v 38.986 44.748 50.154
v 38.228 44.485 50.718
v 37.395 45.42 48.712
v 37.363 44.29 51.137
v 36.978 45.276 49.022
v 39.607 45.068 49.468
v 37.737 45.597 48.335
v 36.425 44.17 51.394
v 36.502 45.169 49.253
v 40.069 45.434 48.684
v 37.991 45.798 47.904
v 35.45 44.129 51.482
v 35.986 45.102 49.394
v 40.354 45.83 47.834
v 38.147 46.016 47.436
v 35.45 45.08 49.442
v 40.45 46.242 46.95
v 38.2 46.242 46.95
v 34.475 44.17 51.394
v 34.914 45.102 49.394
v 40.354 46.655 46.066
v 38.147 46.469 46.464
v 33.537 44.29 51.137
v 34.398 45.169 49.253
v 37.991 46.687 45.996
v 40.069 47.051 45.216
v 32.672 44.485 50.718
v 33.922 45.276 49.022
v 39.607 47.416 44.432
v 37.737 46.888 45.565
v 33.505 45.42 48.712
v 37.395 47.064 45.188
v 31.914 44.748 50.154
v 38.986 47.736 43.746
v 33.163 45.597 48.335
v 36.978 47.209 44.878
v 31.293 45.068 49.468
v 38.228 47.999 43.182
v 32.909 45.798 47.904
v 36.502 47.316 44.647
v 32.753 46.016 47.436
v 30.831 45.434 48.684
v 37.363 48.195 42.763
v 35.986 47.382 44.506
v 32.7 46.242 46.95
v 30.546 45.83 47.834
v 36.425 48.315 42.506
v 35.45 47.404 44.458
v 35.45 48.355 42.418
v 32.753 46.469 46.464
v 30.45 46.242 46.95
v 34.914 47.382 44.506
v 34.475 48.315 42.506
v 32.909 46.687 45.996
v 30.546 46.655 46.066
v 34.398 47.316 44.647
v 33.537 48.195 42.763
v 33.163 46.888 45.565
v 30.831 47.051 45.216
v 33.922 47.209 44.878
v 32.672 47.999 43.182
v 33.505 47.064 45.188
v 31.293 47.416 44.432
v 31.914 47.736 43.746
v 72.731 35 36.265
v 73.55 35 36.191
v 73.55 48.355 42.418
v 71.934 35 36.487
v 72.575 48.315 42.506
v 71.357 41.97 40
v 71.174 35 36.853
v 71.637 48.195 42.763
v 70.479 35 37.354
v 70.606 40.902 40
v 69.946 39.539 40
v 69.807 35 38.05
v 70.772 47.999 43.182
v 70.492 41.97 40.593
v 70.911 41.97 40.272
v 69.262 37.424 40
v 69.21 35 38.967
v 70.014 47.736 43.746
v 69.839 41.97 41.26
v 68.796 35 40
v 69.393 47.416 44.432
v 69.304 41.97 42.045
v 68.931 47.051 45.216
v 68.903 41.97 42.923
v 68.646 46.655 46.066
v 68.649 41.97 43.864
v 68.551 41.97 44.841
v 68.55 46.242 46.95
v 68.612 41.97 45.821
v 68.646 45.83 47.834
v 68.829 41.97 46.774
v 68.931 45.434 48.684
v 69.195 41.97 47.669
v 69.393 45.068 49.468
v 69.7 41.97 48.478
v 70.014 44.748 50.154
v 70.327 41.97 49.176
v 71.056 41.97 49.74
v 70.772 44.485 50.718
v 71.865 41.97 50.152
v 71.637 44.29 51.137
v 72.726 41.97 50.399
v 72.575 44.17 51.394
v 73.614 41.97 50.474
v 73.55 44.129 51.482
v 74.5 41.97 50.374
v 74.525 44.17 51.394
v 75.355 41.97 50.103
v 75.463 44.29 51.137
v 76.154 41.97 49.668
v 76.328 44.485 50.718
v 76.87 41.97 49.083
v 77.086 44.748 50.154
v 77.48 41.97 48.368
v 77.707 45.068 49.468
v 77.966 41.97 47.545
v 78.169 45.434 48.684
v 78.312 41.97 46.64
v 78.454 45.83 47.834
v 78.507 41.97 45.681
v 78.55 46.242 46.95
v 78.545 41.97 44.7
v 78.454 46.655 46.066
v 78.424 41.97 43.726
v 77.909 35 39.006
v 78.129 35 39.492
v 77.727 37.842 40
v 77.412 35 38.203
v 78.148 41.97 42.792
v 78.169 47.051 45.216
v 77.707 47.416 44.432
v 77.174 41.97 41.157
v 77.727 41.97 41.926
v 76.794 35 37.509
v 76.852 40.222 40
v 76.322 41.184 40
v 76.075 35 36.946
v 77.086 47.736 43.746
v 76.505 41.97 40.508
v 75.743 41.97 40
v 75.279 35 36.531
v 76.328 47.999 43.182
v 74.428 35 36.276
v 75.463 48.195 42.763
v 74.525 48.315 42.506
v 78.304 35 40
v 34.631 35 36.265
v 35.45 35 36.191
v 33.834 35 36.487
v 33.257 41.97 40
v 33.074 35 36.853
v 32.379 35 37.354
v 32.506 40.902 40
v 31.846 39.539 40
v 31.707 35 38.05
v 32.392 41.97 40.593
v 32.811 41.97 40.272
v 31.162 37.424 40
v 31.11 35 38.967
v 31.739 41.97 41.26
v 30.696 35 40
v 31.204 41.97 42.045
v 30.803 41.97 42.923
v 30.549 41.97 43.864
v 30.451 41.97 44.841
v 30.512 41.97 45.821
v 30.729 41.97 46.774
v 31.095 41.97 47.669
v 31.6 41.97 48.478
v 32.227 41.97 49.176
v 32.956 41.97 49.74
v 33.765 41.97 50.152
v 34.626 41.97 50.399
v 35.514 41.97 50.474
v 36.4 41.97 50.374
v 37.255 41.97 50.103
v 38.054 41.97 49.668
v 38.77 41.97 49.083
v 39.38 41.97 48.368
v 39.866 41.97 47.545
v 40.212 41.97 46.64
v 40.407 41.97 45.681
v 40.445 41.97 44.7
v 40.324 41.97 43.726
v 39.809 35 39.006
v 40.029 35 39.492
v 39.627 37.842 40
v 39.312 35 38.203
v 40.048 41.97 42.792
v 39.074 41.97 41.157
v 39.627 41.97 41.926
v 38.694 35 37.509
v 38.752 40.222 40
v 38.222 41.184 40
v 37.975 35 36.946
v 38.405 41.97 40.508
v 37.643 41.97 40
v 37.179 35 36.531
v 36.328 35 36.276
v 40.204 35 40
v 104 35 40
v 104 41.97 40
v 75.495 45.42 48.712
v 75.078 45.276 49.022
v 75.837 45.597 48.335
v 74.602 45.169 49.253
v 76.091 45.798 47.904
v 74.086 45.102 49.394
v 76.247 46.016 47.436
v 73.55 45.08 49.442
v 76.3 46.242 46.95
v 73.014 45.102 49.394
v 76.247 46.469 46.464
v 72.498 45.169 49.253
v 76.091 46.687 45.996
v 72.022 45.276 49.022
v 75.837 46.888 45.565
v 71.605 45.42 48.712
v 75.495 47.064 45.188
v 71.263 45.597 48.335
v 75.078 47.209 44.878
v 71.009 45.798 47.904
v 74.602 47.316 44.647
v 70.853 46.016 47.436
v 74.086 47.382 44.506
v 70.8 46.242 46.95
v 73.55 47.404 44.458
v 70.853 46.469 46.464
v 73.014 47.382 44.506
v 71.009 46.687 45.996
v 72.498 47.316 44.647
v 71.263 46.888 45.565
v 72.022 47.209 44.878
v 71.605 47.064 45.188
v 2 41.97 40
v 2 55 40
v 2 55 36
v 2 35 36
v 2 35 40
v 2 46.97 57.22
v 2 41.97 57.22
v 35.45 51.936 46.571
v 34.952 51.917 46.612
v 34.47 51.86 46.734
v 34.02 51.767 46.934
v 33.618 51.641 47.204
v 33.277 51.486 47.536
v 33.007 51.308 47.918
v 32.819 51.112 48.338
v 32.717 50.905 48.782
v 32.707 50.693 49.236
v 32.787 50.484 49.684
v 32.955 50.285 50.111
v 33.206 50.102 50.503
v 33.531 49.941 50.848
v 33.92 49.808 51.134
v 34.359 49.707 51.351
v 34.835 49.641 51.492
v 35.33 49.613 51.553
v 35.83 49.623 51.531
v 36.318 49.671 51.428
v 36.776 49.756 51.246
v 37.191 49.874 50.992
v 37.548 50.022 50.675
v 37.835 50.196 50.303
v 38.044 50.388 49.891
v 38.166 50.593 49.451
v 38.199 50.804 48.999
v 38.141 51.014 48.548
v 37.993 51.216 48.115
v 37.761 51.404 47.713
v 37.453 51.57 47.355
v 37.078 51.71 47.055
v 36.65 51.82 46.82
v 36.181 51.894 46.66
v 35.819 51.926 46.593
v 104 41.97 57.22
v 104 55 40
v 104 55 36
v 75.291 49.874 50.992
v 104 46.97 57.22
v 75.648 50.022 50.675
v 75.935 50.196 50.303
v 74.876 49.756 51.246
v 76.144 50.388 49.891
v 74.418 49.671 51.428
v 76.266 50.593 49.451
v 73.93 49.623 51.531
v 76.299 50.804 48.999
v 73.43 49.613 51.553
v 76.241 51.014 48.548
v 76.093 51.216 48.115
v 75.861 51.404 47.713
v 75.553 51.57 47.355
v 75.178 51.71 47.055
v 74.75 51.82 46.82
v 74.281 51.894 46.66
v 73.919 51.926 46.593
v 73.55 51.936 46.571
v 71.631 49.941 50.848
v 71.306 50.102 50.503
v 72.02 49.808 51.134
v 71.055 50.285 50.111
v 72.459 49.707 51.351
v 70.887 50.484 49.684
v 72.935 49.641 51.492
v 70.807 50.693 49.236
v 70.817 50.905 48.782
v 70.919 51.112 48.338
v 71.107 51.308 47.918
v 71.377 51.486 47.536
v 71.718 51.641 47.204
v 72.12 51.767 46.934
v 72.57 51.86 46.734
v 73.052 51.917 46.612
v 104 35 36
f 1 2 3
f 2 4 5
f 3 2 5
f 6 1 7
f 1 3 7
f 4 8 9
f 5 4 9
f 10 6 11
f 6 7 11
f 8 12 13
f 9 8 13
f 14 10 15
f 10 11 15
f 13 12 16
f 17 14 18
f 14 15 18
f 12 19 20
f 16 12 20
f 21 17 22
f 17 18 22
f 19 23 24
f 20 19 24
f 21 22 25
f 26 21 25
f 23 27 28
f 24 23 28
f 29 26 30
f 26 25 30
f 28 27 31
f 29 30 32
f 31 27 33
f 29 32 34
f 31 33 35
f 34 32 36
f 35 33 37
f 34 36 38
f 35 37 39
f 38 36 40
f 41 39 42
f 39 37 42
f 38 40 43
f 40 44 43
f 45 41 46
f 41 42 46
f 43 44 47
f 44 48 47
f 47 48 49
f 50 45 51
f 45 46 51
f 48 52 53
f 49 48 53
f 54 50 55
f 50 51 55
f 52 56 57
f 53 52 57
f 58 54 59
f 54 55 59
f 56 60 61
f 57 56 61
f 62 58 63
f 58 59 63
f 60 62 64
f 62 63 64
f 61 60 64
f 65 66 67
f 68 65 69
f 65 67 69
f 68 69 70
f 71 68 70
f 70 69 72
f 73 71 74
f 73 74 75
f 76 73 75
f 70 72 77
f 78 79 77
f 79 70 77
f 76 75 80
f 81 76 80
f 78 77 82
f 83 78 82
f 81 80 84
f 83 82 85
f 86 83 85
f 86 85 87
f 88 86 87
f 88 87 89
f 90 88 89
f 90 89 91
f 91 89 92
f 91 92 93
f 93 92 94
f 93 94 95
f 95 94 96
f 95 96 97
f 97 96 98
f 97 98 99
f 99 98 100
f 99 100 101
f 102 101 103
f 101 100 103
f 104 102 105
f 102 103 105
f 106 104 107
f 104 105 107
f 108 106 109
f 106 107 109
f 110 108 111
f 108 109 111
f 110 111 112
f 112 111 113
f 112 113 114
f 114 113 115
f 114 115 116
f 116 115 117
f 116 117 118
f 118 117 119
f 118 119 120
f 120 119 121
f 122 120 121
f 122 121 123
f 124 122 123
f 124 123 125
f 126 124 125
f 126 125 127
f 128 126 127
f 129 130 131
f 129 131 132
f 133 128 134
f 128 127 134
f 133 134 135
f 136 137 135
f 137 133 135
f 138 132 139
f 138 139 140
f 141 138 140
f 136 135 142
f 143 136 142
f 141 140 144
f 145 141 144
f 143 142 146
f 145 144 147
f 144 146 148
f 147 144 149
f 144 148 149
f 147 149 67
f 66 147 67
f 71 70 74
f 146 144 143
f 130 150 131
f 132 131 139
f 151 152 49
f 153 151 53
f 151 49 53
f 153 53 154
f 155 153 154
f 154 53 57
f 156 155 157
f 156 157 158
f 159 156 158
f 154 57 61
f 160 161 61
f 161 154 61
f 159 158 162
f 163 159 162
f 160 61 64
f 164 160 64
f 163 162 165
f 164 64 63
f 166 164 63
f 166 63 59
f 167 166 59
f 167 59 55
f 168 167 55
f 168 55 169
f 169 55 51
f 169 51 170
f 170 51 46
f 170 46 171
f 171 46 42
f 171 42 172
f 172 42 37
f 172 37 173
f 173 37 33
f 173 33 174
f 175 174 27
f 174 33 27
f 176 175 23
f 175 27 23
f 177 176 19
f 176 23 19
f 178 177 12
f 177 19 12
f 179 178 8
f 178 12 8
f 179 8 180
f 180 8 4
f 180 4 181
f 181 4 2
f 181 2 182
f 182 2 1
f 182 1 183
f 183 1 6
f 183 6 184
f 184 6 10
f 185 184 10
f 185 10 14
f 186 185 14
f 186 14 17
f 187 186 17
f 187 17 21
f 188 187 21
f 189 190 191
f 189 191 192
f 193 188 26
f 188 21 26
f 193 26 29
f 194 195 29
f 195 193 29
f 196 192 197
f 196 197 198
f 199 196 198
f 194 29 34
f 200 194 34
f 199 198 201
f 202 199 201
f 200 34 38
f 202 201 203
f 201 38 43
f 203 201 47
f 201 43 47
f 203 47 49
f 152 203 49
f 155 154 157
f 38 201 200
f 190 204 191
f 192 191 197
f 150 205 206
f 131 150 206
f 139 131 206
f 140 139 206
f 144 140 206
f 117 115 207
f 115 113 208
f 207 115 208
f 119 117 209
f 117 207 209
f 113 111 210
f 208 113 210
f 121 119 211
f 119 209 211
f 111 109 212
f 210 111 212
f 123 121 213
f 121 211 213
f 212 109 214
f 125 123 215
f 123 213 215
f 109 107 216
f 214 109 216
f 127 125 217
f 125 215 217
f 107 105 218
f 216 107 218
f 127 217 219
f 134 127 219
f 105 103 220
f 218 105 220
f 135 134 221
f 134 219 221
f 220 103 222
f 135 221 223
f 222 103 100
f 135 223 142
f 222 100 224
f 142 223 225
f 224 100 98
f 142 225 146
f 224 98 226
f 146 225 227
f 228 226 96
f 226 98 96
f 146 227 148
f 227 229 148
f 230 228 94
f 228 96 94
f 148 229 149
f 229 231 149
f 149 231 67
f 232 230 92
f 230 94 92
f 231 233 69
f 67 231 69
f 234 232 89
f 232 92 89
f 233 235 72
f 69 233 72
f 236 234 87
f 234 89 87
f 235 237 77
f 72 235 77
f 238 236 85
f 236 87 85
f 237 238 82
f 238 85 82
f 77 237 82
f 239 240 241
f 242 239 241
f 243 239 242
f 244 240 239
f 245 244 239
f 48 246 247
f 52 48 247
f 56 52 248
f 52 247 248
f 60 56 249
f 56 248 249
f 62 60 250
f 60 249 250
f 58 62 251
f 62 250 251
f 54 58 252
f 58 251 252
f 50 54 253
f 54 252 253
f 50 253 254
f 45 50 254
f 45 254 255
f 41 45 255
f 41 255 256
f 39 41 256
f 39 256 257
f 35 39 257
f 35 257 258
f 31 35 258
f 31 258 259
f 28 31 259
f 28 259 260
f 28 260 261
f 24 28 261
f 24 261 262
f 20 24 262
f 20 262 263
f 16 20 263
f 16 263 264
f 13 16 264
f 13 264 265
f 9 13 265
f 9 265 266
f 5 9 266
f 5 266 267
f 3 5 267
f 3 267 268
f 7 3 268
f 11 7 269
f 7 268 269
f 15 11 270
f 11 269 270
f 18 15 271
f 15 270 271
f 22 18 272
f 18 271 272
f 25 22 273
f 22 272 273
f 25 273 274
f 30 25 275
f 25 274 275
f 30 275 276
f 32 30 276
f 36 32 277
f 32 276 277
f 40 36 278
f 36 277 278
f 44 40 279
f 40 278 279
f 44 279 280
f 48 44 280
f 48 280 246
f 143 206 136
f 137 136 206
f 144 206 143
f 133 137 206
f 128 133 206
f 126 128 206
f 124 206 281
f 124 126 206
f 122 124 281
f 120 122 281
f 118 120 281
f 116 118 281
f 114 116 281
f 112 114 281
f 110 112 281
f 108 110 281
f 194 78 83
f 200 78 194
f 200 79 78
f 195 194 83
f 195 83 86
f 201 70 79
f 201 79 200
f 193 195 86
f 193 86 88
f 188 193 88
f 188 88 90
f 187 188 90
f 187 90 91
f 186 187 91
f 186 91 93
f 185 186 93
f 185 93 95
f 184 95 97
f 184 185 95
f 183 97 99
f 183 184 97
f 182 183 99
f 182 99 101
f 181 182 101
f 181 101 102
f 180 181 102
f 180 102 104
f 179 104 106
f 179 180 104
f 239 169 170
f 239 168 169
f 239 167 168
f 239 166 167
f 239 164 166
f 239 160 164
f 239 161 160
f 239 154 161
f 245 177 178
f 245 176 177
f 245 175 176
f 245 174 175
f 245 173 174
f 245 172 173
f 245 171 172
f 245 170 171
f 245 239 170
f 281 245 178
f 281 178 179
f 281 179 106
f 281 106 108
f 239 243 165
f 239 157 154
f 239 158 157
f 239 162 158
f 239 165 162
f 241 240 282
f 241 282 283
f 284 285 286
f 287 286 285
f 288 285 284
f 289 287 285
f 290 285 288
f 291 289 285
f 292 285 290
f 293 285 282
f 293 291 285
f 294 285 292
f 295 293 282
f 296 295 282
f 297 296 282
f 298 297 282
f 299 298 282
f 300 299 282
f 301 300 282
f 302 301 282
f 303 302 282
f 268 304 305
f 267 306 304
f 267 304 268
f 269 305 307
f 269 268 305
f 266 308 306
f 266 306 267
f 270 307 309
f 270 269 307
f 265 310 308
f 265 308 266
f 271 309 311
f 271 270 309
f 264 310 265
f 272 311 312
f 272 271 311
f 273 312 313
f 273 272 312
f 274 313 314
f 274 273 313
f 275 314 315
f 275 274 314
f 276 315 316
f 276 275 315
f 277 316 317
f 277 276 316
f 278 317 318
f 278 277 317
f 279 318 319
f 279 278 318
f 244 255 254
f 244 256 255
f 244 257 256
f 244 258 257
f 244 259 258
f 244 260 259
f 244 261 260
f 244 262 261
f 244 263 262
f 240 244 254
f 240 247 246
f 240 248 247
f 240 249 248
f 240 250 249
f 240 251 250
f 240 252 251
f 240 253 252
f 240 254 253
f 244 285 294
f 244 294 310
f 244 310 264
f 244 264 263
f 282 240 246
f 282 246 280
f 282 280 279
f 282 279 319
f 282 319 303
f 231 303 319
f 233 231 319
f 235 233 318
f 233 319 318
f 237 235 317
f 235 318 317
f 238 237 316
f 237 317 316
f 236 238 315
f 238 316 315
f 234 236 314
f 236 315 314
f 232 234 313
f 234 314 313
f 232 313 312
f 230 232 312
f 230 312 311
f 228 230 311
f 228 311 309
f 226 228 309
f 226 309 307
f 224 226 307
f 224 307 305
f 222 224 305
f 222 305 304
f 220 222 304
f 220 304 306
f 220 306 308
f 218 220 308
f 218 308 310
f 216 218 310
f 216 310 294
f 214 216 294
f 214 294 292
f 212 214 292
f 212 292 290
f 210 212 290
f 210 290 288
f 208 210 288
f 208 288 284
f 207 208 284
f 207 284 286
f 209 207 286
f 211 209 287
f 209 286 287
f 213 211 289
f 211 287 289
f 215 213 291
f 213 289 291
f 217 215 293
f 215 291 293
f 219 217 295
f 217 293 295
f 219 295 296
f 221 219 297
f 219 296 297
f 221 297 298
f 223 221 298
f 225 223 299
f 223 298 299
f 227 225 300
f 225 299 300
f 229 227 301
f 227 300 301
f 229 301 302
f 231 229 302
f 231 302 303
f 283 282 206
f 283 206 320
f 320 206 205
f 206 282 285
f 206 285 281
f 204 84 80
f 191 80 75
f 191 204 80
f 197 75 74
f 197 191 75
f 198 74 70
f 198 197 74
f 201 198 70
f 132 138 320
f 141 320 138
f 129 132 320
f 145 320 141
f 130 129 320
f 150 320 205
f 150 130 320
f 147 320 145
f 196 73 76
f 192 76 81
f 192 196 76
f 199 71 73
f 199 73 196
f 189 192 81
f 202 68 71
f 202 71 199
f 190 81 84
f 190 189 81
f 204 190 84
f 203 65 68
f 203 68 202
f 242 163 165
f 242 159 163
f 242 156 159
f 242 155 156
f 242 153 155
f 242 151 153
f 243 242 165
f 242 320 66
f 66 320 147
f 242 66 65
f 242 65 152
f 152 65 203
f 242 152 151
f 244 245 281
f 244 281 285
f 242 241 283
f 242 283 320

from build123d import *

# Parameters (mm, degrees)
PAD004_DEPTH            = 102
SKETCH006_R             = 2.75
POCKET001_DEPTH         = 19.817629
SKETCH007_R             = 5
POCKET002_DEPTH         = 14.817629
BODY002_PLACEMENT_ANGLE = 180


with BuildPart() as part:
    # Sketch004 → Pad004 (new body)
    with BuildSketch(Plane.YZ):
        Polygon((-6.970253, 4), (-6.970253, 21.219848), (-11.970253, 21.219848), (-20, 4), (-20, 0), (0, 0), (0, 4), align=None)
    extrude(amount=-PAD004_DEPTH)

    # Sketch006 (on Face3 of Pad004) → Pocket001 (cut, through all)
    with BuildSketch(Plane(origin=(0, -17.959965, 8.374869), x_dir=(0, -0.422618, -0.906308), z_dir=(0, -0.906308, 0.422618))):
        with Locations((-5.172866, -33.45)):
            Circle(SKETCH006_R)
        with Locations((-5.172866, -71.55)):
            Circle(SKETCH006_R)
    extrude(amount=-POCKET001_DEPTH, mode=Mode.SUBTRACT)

    # Sketch007 (on Face9 of Pocket001) → Pocket002 (cut, through all)
    with BuildSketch(Plane(origin=(0, -13.428426, 6.261778), x_dir=(0, -0.422618, -0.906308), z_dir=(0, -0.906308, 0.422618))):
        with Locations((-5.172866, -33.45)):
            Circle(SKETCH007_R)
        with Locations((-5.172866, -71.55)):
            Circle(SKETCH007_R)
    extrude(amount=-POCKET002_DEPTH, mode=Mode.SUBTRACT)


with BuildPart() as part_1:
    # Body002 placement: moved
    add(part.part.moved(Location((2, 35, 36))).rotate(Axis((2, 35, 36), (0, 0, 1)), BODY002_PLACEMENT_ANGLE))


solid = part_1.part
